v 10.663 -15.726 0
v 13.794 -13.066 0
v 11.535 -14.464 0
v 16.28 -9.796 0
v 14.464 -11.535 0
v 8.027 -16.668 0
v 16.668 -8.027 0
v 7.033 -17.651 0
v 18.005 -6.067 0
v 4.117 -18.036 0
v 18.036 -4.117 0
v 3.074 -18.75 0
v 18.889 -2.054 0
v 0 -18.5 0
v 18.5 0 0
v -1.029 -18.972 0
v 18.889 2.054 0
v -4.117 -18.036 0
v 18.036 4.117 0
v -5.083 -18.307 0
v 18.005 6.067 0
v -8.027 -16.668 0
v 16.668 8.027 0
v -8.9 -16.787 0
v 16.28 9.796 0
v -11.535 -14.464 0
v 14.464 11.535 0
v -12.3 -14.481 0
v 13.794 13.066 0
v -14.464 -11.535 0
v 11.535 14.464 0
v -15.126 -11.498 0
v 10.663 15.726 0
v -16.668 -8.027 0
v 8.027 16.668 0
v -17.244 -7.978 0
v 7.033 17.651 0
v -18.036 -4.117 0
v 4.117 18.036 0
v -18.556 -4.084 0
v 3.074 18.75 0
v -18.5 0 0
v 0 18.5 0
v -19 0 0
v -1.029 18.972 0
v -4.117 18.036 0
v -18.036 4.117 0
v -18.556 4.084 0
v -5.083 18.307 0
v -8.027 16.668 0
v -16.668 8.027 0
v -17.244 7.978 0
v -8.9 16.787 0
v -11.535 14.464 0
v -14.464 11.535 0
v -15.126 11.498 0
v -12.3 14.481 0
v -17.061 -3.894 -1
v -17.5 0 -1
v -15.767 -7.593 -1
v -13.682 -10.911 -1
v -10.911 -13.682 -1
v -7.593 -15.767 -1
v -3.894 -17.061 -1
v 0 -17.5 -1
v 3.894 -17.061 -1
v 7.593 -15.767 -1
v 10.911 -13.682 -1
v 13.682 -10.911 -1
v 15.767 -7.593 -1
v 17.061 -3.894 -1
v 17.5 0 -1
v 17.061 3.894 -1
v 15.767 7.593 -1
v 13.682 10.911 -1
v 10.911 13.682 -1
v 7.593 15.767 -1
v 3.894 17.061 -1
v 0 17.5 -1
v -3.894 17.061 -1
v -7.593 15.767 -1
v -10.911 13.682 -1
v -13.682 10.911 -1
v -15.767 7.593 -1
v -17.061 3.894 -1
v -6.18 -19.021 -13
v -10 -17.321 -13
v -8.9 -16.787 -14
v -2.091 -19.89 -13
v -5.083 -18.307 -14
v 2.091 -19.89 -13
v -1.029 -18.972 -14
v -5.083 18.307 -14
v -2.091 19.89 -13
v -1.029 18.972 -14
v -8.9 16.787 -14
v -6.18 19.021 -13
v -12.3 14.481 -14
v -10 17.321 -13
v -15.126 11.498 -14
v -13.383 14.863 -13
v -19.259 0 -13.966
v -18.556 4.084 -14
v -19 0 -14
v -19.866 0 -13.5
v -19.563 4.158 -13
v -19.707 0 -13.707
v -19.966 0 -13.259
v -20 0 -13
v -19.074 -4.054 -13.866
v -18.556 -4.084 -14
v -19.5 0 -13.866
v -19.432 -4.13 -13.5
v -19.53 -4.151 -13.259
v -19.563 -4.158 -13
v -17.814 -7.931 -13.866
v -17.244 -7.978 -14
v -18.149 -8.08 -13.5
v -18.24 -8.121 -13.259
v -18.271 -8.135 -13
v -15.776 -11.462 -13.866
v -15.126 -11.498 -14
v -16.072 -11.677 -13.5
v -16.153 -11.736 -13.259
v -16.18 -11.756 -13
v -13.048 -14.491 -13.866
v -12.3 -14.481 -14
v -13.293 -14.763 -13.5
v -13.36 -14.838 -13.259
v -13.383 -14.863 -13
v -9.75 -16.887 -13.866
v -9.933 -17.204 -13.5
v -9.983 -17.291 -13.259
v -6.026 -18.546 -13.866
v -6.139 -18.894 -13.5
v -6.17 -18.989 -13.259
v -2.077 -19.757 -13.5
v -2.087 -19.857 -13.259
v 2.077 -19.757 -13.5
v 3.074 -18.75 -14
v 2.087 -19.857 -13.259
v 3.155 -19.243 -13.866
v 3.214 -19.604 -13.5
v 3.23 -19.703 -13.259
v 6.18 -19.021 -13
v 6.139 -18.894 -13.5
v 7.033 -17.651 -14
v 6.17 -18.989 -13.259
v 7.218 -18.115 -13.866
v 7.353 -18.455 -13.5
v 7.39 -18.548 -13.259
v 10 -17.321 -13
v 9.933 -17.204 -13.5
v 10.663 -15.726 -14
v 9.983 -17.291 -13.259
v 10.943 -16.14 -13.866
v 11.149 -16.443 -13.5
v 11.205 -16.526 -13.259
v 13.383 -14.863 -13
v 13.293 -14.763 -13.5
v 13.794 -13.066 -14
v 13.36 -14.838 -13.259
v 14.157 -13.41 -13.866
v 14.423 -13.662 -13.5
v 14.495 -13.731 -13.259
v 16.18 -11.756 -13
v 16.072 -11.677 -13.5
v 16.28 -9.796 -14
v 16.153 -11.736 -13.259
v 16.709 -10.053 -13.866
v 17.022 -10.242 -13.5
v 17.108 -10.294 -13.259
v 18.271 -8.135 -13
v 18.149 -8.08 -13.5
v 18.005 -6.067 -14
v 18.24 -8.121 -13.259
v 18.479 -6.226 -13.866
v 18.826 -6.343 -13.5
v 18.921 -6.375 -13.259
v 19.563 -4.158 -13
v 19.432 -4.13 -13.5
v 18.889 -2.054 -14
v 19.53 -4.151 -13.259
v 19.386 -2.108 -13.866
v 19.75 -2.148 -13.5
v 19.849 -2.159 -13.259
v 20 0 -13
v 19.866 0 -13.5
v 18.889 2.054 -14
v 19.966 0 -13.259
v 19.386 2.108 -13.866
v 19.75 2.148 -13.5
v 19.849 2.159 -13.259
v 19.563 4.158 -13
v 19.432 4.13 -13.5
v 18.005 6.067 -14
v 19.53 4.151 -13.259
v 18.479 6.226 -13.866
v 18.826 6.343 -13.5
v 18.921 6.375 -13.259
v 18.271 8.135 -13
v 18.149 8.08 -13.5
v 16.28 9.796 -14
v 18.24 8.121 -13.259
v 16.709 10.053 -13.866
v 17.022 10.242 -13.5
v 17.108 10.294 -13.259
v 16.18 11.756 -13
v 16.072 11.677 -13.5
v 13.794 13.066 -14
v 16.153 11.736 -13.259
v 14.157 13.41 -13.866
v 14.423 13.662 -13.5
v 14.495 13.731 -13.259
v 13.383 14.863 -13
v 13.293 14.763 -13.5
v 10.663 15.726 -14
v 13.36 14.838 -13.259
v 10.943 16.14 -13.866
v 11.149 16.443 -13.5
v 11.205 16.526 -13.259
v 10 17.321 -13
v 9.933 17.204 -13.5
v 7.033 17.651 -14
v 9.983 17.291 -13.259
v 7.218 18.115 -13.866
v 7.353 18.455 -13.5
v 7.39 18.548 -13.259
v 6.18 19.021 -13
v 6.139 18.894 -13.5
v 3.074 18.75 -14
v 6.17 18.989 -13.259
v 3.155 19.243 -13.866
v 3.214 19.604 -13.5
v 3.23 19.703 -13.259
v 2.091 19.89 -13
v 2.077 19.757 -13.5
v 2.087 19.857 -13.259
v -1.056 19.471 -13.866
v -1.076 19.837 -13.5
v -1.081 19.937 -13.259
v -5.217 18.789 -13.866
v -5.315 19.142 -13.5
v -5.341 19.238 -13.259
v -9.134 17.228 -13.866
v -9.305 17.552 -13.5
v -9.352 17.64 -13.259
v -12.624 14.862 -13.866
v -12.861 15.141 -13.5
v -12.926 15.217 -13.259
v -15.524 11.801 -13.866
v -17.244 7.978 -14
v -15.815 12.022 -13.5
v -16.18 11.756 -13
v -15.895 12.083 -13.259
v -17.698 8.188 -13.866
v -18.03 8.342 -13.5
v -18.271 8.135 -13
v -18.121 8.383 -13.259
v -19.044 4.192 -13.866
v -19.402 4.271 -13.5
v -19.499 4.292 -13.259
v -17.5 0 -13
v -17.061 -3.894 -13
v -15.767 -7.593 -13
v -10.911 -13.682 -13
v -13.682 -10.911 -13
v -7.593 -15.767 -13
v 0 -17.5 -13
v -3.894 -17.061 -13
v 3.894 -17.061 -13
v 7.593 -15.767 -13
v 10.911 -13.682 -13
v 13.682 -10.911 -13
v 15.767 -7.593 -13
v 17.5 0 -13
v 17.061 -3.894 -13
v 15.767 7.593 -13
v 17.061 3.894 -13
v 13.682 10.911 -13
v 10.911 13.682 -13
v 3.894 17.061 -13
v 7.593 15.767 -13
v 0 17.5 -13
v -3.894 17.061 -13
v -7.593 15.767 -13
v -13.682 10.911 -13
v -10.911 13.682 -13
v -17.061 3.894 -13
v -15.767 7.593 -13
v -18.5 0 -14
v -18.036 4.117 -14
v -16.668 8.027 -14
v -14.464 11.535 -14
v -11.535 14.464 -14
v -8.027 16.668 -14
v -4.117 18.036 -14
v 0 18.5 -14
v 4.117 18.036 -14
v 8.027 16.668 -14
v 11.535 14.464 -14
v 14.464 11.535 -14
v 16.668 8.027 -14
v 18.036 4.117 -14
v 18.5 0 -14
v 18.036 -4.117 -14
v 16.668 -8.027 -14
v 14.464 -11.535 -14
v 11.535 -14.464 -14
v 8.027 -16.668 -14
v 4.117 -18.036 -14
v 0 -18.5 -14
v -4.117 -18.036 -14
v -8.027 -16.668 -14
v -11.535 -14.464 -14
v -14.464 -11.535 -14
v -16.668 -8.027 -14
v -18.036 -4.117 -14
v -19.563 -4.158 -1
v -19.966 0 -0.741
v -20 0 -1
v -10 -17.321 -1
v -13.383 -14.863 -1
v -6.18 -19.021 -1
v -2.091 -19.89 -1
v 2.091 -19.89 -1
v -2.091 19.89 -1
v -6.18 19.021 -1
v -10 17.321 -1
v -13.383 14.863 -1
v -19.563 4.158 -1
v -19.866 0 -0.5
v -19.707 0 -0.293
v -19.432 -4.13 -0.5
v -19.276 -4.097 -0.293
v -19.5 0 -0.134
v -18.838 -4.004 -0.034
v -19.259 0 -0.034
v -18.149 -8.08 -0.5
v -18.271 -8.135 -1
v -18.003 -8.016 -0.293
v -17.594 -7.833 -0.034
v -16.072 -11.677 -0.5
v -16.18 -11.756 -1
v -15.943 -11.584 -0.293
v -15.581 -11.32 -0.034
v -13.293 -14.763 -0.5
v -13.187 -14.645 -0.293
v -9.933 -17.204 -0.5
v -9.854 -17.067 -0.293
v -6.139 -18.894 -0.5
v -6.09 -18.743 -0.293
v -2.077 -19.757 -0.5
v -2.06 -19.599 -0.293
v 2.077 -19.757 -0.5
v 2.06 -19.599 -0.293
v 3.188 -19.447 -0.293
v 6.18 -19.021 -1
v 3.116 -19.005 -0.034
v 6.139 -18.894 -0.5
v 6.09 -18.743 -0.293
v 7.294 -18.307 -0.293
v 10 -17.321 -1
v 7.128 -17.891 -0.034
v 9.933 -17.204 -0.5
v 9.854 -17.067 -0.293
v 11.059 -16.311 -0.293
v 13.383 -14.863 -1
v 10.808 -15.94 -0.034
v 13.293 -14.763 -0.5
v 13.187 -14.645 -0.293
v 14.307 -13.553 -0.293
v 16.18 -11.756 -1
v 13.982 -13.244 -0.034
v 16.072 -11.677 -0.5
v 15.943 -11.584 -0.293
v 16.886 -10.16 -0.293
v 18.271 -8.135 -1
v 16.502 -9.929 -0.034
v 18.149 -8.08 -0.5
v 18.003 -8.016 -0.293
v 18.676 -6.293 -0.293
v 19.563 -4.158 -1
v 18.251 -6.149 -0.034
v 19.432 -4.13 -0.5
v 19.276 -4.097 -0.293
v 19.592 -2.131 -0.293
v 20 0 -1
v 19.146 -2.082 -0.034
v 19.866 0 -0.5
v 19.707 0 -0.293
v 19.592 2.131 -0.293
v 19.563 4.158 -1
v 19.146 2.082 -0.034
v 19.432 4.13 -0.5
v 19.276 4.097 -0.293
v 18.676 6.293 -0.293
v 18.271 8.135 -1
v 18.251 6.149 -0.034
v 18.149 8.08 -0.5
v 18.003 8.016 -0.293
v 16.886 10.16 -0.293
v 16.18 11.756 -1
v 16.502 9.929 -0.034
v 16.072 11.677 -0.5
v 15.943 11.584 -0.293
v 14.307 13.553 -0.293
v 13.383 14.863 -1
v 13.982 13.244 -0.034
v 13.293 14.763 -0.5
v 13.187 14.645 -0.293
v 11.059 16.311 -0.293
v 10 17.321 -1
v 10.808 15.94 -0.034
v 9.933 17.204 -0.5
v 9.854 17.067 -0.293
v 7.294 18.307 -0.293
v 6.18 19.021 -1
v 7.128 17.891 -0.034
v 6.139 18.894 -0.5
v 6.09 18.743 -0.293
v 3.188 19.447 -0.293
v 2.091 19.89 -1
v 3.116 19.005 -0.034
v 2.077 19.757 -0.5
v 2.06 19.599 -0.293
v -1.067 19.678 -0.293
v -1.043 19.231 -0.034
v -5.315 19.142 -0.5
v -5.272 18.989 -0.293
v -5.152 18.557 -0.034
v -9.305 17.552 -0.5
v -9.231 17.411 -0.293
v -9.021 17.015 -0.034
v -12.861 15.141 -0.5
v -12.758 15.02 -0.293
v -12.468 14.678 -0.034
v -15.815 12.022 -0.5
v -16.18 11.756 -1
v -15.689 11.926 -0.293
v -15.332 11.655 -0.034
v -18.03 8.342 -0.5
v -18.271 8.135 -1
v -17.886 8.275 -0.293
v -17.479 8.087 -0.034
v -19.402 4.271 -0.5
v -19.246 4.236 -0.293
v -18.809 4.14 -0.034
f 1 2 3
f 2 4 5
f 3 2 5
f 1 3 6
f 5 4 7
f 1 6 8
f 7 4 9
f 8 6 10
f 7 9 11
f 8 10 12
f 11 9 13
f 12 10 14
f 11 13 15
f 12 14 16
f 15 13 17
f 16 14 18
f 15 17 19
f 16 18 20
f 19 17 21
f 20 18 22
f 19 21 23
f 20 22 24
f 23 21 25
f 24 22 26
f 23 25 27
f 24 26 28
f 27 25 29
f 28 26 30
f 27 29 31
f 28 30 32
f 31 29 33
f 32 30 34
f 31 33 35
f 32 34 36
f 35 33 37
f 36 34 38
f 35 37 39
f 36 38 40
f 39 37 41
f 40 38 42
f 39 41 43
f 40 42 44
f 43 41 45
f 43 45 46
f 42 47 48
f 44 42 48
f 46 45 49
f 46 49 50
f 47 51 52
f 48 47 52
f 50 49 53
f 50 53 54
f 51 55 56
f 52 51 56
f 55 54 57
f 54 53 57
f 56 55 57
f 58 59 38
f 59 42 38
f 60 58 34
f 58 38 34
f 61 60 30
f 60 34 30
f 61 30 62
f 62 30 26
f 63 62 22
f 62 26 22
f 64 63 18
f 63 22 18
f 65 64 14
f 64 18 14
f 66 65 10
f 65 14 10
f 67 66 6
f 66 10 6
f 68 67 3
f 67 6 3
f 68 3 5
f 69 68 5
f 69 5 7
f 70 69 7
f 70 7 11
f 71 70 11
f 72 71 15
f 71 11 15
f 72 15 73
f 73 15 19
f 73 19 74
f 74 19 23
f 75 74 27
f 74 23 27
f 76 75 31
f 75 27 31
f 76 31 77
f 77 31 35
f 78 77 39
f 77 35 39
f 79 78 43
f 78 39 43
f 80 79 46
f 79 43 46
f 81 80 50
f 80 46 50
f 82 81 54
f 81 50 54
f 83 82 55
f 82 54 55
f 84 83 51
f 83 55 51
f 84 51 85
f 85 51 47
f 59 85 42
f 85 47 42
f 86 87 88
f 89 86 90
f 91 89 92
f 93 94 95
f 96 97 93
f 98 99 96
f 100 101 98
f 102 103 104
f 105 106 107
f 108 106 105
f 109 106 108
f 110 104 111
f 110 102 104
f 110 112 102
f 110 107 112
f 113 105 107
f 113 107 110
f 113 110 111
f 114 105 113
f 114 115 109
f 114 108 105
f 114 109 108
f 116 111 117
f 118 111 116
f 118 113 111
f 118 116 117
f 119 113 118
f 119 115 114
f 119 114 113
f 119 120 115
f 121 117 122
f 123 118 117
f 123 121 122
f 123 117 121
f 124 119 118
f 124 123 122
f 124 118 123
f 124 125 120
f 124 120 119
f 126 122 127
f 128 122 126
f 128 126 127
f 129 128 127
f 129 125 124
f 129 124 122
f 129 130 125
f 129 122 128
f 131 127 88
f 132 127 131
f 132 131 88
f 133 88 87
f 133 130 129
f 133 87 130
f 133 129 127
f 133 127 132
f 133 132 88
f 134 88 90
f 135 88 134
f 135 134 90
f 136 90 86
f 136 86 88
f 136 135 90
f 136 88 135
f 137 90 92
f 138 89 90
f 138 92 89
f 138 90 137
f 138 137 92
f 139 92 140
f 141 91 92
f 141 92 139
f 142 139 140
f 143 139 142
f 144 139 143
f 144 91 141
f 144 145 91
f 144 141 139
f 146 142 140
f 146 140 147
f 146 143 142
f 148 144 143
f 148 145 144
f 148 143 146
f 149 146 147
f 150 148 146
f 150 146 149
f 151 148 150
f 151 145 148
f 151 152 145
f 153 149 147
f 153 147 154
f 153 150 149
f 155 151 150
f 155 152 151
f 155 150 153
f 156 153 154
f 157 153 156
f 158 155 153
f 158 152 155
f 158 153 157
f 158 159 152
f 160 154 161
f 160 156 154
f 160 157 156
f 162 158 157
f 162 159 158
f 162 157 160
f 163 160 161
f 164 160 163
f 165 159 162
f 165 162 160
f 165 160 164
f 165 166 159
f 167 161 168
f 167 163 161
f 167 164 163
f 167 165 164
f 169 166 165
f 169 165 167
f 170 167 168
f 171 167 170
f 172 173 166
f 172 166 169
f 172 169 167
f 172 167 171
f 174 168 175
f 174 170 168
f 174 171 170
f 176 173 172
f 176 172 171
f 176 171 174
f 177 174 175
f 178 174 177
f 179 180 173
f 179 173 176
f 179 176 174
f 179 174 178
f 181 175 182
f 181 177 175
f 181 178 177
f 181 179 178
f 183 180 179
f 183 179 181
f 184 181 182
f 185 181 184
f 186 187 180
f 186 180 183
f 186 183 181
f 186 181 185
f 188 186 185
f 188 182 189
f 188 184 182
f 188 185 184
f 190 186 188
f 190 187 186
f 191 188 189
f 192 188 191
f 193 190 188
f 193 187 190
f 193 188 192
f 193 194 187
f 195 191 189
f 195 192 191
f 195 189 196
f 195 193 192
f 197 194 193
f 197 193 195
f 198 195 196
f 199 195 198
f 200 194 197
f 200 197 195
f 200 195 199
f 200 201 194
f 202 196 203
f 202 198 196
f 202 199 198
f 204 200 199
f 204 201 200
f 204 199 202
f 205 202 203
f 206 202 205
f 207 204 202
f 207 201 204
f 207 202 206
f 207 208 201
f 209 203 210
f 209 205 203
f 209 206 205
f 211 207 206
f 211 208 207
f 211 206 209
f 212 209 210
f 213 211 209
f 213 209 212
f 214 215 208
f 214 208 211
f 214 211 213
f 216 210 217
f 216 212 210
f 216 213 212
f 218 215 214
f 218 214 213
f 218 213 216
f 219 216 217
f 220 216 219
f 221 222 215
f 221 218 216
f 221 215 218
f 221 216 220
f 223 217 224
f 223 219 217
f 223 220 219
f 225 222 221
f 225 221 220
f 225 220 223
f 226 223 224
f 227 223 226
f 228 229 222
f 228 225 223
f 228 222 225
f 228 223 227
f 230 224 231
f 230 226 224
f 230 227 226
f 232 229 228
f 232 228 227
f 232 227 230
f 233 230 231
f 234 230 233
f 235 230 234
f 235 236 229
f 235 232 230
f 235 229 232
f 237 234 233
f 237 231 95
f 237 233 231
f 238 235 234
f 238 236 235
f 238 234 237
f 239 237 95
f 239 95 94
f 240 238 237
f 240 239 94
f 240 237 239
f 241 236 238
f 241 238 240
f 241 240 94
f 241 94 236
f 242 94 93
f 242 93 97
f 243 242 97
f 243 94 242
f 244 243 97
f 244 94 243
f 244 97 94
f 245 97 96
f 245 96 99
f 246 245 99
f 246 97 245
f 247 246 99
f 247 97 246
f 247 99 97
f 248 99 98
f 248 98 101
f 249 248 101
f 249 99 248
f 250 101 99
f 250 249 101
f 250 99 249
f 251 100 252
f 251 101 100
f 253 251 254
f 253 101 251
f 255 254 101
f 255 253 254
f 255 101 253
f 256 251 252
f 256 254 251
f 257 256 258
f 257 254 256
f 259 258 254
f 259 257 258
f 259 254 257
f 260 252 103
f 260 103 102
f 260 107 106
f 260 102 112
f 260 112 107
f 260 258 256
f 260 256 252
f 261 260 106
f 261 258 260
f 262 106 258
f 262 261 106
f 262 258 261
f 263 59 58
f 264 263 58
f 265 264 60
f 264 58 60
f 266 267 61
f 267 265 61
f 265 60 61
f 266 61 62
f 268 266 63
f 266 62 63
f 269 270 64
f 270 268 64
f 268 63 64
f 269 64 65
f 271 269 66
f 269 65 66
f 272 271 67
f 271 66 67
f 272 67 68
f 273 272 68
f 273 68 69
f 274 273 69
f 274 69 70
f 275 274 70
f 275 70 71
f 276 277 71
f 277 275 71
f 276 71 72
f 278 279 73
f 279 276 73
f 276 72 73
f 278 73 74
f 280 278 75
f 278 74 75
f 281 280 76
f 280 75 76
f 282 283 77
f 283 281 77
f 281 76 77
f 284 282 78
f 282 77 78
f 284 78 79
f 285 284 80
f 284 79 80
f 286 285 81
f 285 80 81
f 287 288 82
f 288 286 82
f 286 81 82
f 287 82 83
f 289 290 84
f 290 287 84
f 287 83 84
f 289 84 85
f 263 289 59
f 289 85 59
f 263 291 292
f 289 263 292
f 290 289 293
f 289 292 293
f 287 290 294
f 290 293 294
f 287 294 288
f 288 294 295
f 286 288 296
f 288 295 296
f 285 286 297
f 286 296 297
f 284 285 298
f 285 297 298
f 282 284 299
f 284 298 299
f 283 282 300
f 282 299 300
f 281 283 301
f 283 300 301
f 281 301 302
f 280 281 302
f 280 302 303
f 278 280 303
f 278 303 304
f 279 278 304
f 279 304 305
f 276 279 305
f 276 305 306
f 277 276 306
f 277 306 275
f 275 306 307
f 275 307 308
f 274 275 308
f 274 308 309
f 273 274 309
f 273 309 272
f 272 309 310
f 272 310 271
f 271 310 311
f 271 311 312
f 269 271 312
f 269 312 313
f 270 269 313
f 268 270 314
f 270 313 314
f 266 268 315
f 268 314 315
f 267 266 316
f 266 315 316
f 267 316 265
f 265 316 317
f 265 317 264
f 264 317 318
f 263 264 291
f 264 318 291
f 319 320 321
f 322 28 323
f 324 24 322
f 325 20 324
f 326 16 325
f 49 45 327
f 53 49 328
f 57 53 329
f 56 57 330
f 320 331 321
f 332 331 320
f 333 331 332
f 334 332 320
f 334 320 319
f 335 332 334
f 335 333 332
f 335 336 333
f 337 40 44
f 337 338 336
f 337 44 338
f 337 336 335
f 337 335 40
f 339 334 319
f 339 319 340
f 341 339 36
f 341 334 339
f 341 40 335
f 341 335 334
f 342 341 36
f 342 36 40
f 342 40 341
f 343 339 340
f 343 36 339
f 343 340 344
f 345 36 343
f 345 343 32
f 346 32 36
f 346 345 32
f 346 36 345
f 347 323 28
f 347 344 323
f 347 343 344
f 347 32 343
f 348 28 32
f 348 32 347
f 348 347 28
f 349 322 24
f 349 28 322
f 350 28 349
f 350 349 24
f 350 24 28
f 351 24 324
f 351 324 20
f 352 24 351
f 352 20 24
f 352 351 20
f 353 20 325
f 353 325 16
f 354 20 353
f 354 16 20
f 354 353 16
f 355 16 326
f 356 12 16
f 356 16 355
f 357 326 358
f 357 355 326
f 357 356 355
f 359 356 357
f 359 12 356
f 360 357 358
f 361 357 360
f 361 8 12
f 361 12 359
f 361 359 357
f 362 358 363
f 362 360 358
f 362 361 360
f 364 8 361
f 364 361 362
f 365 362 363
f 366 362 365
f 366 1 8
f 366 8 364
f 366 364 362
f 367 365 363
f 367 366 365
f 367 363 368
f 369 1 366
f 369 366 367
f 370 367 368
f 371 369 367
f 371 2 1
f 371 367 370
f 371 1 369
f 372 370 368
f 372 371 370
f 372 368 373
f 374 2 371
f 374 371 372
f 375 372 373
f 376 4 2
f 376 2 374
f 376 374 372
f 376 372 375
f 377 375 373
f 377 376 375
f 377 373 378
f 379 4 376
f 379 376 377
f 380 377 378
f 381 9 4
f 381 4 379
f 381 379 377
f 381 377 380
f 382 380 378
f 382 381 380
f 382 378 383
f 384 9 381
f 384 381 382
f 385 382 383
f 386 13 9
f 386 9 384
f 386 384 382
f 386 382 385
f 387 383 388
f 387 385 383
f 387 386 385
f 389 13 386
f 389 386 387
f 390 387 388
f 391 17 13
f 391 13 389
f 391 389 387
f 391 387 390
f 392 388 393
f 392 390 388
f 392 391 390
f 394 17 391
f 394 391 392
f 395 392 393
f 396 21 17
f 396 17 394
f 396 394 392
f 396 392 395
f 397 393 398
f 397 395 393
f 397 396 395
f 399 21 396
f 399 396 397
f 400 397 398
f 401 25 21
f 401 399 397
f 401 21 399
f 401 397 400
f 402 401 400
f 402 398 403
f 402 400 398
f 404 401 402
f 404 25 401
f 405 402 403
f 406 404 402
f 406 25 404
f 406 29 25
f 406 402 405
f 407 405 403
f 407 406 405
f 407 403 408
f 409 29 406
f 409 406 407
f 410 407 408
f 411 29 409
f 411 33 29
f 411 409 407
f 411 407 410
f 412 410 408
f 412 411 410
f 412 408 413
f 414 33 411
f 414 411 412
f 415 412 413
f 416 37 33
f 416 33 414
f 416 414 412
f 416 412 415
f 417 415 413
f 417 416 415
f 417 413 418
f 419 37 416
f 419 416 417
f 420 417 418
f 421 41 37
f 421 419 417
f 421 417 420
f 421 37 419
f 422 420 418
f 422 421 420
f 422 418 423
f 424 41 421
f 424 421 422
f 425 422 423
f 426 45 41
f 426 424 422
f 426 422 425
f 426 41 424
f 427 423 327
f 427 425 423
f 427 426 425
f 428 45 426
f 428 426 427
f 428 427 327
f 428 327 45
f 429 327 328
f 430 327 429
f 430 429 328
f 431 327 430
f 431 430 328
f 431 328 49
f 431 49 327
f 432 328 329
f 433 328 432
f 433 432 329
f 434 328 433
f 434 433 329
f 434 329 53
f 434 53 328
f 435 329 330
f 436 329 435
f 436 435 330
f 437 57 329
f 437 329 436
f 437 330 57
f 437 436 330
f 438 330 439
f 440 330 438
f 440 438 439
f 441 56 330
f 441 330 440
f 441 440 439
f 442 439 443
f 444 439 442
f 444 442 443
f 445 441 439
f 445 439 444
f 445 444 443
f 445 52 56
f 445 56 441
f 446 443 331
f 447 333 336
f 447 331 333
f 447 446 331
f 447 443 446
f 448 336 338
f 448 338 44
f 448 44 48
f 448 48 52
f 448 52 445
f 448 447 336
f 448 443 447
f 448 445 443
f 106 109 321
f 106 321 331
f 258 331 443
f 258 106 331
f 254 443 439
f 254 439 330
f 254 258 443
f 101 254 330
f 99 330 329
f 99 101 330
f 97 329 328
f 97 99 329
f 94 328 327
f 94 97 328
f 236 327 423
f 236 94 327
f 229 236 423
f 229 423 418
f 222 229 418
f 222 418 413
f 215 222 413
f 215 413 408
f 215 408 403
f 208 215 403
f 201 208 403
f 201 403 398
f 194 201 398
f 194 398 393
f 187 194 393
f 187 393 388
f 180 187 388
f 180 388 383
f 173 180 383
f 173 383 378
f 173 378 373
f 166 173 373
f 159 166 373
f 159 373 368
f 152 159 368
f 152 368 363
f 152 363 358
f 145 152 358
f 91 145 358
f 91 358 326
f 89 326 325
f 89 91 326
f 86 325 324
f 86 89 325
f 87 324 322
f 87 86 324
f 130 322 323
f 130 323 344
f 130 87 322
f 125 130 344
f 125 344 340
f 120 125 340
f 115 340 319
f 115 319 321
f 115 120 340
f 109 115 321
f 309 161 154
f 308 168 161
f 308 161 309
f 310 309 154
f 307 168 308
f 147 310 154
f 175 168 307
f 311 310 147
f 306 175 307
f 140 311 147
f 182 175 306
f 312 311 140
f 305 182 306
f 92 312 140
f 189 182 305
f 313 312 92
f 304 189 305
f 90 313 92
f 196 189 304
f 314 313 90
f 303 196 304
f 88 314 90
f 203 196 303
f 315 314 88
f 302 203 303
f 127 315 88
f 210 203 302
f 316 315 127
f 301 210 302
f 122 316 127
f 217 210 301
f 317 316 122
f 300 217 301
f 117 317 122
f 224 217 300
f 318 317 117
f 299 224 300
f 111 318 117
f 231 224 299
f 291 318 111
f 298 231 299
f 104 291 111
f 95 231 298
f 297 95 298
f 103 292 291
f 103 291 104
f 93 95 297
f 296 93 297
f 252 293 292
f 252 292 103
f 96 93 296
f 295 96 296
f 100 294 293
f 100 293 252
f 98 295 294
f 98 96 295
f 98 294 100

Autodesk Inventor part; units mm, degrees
ref_plane "YZ Plane" through (0, 0, 0) normal (1, 0, 0) x (0, 1, 0)
ref_plane "XZ Plane" through (0, 0, 0) normal (0, 1, 0) x (-1, 0, 0)
ref_plane "XY Plane" through (0, 0, 0) normal (0, 0, 1) x (1, 0, 0)
sketch "Sketch1" plane through (0, 0, 0) normal (0, 1, 0) x (-1, 0, 0)
  line L0 (0, 0) -> (0, -14) construction
  line L1 (18.5, 0) -> (19, 0)
  line L2 (20, -1) -> (20, -13)
  line L3 (19, -14) -> (18.5, -14)
  line L4 (17.5, -13) -> (17.5, -1)
  arc A0 (20, -1) -> (19, 0) centre (19, -1) ccw
  arc A1 (19, -14) -> (20, -13) centre (19, -13) ccw
  line L5 (18.5, 0) -> (17.5, -1)
  line L6 (18.5, -14) -> (17.5, -13)
  dimension "d0" = 14
  dimension "d1" = 17.5
  dimension "d2" = 20
  dimension "d3" = 14
  dimension "d4" = 1
  dimension "d5" = 18.5
  dimension "d6" = 1
  dimension "d7" = 18.5
  dimension "d8" = 1
revolve "Revolution1" add sketch "Sketch1" angle 360 about axis through (0, 0, 0) along (0, 0, -1)
properties part number "26-10-206 Spannrad Stufe 2, Riemenspanner"
